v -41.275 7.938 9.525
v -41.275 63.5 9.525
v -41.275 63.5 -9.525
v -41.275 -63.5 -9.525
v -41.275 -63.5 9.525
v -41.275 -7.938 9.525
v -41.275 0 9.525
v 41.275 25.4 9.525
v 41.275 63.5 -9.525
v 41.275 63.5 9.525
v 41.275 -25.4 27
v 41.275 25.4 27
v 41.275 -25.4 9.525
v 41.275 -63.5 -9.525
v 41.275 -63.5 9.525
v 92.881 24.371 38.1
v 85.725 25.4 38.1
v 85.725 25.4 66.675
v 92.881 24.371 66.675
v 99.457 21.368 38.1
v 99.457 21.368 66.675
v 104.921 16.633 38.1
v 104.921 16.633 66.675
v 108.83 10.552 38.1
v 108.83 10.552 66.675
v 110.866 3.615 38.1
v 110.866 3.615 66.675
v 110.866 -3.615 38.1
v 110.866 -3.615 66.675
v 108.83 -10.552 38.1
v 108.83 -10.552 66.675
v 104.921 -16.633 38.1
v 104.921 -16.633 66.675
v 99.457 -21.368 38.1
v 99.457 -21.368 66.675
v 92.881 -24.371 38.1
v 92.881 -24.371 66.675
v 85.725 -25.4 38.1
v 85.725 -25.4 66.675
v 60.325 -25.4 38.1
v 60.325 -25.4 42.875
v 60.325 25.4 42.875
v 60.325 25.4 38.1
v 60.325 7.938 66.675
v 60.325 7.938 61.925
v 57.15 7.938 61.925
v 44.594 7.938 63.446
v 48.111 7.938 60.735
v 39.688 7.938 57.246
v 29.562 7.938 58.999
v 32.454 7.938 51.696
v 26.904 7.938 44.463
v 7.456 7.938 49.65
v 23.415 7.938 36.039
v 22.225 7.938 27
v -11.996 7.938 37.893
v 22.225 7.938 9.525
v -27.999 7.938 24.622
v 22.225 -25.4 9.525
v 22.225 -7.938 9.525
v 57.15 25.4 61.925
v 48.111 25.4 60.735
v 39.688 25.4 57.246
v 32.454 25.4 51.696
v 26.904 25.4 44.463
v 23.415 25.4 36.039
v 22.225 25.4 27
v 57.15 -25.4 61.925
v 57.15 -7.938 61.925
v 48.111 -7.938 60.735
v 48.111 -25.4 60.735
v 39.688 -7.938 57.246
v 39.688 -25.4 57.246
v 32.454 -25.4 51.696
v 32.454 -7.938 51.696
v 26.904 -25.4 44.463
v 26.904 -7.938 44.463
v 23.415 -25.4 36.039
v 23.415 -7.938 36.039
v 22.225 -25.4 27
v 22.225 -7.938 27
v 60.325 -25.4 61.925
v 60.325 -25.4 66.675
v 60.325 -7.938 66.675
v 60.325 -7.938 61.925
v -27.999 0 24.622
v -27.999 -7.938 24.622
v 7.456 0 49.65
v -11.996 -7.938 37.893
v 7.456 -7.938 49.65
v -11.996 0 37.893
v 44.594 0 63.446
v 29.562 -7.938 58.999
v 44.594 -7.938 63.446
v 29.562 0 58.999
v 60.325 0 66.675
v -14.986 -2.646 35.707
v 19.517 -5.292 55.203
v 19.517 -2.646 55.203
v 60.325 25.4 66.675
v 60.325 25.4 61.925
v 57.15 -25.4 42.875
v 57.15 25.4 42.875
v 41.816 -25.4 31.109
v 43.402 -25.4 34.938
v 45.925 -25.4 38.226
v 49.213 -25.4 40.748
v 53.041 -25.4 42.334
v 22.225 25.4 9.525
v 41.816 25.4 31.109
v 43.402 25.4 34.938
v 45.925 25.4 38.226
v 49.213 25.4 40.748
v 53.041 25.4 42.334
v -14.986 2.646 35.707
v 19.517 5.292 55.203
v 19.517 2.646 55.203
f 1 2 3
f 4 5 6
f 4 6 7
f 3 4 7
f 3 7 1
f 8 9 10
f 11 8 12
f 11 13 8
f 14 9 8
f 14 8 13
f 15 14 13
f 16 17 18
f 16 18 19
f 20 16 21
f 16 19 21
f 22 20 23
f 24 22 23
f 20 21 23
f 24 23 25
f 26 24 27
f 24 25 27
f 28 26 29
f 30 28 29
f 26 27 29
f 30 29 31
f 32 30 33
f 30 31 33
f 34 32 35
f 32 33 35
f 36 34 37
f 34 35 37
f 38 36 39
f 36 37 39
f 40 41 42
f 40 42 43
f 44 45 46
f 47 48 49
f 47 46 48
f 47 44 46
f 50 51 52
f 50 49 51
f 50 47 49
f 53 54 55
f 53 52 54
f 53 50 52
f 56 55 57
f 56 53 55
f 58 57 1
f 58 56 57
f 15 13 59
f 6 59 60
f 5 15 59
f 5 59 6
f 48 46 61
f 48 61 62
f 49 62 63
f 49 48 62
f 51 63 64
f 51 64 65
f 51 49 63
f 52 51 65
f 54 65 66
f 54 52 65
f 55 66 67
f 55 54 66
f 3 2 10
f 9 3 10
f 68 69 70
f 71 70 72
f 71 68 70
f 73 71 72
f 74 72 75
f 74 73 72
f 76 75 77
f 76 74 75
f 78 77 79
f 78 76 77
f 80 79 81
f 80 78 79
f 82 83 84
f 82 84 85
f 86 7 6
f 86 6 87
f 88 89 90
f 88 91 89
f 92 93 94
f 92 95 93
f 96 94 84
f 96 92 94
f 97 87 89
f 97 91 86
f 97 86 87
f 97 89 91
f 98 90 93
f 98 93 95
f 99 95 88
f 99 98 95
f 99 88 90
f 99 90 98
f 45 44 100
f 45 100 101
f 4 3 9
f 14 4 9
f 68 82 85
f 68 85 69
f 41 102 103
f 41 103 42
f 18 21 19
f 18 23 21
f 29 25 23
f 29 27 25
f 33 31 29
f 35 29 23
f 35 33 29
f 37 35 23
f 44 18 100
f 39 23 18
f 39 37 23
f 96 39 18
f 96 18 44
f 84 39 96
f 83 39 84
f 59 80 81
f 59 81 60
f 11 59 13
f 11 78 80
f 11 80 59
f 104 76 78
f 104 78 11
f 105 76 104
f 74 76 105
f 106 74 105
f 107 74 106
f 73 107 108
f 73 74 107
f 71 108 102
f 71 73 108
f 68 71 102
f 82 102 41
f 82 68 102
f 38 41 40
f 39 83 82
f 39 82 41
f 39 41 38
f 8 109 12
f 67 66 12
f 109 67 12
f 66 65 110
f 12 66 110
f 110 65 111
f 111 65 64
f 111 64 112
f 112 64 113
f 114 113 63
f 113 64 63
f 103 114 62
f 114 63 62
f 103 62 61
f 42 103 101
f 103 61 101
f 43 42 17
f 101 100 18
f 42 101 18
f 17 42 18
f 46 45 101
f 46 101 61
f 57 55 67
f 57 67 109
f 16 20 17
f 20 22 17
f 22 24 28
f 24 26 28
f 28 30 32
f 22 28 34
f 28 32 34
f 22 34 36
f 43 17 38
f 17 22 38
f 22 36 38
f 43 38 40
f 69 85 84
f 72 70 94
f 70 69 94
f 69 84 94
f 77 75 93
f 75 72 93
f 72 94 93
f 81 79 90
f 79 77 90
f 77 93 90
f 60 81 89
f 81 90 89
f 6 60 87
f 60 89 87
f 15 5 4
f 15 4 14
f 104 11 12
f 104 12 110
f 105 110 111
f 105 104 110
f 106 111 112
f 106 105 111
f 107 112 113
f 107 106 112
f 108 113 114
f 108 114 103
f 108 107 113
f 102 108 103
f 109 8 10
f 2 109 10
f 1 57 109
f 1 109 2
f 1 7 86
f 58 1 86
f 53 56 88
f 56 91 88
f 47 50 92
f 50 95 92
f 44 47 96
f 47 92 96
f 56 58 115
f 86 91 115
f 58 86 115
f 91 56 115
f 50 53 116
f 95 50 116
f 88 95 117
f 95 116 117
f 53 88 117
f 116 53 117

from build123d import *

# Parameters (mm, degrees)
F1_DEPTH = 63.5
F2_DEPTH = 25.4
F3_DEPTH = 7.9375
F0_W     = 25.4
F0_H     = 28.575


with BuildPart() as f1:
    # F0 (on Front) → F1 (new body, symmetric)
    with BuildSketch(Plane.XZ):
        Polygon((-41.275, 9.525), (-41.275, -9.525), (41.275, -9.525), (41.275, 9.525), (22.225, 9.525), align=None)
    extrude(amount=F1_DEPTH, both=True)

    # F0 (on Front) → F2 (join, symmetric)
    with BuildSketch(Plane.XZ):
        with BuildLine():
            Line((22.225, 9.525), (41.275, 9.525))
            Line((41.275, 9.525), (41.275, 27.0002))
            ThreePointArc((41.275, 27.0002), (45.92468, 38.22552), (57.15, 42.8752))
            Line((57.15, 42.8752), (60.325, 42.8752))
            Line((60.325, 42.8752), (60.325, 61.9252))
            Line((60.325, 61.9252), (57.15, 61.9252))
            ThreePointArc((57.15, 61.9252), (32.454296, 51.695904), (22.225, 27.0002))
            Line((22.225, 27.0002), (22.225, 9.525))
        make_face()
        Polygon((85.725, 66.675), (60.325, 66.675), (60.325, 61.9252), (60.325, 42.8752), (60.325, 38.1), (85.725, 38.1), align=None)
    extrude(amount=F2_DEPTH, both=True)

    # F0 (on Front) → F3 (join, symmetric)
    with BuildSketch(Plane.XZ):
        with BuildLine():
            add(Edge.make_bspline(
                [(-41.275, 9.525), (-19.730542, 38.604709), (17.001747, 59.660653), (60.325, 66.675)],
                knots=[0, 0, 0, 0, 116.570504, 116.570504, 116.570504, 116.570504], degree=3))
            Line((-41.275, 9.525), (22.225, 9.525))
            Line((22.225, 9.525), (22.225, 27.0002))
            ThreePointArc((22.225, 27.0002), (32.454296, 51.695904), (57.15, 61.9252))
            Line((57.15, 61.9252), (60.325, 61.9252))
            Line((60.325, 61.9252), (60.325, 66.675))
        make_face()
    extrude(amount=F3_DEPTH, both=True)

    # F0 (on Front) → F4 (revolve)
    with BuildSketch(Plane.XZ):
        with Locations((98.425, 52.3875)):
            Rectangle(F0_W, F0_H)
    revolve(axis=Axis((85.725, 0, 52.3875), (0, 0, -1)))


solid = f1.part
